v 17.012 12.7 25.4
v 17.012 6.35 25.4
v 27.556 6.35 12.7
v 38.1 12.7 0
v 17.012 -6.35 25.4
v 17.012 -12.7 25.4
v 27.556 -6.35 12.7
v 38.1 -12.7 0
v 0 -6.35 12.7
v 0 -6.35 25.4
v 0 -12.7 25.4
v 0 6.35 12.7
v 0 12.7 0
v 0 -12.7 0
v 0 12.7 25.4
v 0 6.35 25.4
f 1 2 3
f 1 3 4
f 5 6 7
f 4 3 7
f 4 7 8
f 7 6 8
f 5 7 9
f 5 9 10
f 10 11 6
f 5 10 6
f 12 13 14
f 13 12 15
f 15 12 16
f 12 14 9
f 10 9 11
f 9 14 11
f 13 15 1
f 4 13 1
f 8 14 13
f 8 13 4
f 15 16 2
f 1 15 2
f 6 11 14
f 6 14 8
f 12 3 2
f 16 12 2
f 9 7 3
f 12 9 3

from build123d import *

# Parameters (mm, degrees)
F0_W     = 38.1
F0_H     = 25.4
F1_DEPTH = 12.7
F3_DEPTH = 12.7
F4_W     = 12.7
F4_H     = 12.7
F5_DEPTH = 50.8


with BuildPart() as f1:
    # F0 (on Front) → F1 (new body, symmetric)
    with BuildSketch(Plane.XZ):
        with Locations((19.05, 12.7)):
            Rectangle(F0_W, F0_H)
    extrude(amount=F1_DEPTH, both=True)

    # F2 (on Front) → F3 (cut, symmetric)
    with BuildSketch(Plane.XZ):
        Polygon((38.1, 25.4), (17.01173, 25.4), (38.1, 0), align=None)
    extrude(amount=F3_DEPTH, both=True, mode=Mode.SUBTRACT)

    # F4 (on Right) → F5 (cut)
    with BuildSketch(Plane.YZ):
        with Locations((0, 19.05)):
            Rectangle(F4_W, F4_H)
    extrude(amount=F5_DEPTH, mode=Mode.SUBTRACT)


solid = f1.part
